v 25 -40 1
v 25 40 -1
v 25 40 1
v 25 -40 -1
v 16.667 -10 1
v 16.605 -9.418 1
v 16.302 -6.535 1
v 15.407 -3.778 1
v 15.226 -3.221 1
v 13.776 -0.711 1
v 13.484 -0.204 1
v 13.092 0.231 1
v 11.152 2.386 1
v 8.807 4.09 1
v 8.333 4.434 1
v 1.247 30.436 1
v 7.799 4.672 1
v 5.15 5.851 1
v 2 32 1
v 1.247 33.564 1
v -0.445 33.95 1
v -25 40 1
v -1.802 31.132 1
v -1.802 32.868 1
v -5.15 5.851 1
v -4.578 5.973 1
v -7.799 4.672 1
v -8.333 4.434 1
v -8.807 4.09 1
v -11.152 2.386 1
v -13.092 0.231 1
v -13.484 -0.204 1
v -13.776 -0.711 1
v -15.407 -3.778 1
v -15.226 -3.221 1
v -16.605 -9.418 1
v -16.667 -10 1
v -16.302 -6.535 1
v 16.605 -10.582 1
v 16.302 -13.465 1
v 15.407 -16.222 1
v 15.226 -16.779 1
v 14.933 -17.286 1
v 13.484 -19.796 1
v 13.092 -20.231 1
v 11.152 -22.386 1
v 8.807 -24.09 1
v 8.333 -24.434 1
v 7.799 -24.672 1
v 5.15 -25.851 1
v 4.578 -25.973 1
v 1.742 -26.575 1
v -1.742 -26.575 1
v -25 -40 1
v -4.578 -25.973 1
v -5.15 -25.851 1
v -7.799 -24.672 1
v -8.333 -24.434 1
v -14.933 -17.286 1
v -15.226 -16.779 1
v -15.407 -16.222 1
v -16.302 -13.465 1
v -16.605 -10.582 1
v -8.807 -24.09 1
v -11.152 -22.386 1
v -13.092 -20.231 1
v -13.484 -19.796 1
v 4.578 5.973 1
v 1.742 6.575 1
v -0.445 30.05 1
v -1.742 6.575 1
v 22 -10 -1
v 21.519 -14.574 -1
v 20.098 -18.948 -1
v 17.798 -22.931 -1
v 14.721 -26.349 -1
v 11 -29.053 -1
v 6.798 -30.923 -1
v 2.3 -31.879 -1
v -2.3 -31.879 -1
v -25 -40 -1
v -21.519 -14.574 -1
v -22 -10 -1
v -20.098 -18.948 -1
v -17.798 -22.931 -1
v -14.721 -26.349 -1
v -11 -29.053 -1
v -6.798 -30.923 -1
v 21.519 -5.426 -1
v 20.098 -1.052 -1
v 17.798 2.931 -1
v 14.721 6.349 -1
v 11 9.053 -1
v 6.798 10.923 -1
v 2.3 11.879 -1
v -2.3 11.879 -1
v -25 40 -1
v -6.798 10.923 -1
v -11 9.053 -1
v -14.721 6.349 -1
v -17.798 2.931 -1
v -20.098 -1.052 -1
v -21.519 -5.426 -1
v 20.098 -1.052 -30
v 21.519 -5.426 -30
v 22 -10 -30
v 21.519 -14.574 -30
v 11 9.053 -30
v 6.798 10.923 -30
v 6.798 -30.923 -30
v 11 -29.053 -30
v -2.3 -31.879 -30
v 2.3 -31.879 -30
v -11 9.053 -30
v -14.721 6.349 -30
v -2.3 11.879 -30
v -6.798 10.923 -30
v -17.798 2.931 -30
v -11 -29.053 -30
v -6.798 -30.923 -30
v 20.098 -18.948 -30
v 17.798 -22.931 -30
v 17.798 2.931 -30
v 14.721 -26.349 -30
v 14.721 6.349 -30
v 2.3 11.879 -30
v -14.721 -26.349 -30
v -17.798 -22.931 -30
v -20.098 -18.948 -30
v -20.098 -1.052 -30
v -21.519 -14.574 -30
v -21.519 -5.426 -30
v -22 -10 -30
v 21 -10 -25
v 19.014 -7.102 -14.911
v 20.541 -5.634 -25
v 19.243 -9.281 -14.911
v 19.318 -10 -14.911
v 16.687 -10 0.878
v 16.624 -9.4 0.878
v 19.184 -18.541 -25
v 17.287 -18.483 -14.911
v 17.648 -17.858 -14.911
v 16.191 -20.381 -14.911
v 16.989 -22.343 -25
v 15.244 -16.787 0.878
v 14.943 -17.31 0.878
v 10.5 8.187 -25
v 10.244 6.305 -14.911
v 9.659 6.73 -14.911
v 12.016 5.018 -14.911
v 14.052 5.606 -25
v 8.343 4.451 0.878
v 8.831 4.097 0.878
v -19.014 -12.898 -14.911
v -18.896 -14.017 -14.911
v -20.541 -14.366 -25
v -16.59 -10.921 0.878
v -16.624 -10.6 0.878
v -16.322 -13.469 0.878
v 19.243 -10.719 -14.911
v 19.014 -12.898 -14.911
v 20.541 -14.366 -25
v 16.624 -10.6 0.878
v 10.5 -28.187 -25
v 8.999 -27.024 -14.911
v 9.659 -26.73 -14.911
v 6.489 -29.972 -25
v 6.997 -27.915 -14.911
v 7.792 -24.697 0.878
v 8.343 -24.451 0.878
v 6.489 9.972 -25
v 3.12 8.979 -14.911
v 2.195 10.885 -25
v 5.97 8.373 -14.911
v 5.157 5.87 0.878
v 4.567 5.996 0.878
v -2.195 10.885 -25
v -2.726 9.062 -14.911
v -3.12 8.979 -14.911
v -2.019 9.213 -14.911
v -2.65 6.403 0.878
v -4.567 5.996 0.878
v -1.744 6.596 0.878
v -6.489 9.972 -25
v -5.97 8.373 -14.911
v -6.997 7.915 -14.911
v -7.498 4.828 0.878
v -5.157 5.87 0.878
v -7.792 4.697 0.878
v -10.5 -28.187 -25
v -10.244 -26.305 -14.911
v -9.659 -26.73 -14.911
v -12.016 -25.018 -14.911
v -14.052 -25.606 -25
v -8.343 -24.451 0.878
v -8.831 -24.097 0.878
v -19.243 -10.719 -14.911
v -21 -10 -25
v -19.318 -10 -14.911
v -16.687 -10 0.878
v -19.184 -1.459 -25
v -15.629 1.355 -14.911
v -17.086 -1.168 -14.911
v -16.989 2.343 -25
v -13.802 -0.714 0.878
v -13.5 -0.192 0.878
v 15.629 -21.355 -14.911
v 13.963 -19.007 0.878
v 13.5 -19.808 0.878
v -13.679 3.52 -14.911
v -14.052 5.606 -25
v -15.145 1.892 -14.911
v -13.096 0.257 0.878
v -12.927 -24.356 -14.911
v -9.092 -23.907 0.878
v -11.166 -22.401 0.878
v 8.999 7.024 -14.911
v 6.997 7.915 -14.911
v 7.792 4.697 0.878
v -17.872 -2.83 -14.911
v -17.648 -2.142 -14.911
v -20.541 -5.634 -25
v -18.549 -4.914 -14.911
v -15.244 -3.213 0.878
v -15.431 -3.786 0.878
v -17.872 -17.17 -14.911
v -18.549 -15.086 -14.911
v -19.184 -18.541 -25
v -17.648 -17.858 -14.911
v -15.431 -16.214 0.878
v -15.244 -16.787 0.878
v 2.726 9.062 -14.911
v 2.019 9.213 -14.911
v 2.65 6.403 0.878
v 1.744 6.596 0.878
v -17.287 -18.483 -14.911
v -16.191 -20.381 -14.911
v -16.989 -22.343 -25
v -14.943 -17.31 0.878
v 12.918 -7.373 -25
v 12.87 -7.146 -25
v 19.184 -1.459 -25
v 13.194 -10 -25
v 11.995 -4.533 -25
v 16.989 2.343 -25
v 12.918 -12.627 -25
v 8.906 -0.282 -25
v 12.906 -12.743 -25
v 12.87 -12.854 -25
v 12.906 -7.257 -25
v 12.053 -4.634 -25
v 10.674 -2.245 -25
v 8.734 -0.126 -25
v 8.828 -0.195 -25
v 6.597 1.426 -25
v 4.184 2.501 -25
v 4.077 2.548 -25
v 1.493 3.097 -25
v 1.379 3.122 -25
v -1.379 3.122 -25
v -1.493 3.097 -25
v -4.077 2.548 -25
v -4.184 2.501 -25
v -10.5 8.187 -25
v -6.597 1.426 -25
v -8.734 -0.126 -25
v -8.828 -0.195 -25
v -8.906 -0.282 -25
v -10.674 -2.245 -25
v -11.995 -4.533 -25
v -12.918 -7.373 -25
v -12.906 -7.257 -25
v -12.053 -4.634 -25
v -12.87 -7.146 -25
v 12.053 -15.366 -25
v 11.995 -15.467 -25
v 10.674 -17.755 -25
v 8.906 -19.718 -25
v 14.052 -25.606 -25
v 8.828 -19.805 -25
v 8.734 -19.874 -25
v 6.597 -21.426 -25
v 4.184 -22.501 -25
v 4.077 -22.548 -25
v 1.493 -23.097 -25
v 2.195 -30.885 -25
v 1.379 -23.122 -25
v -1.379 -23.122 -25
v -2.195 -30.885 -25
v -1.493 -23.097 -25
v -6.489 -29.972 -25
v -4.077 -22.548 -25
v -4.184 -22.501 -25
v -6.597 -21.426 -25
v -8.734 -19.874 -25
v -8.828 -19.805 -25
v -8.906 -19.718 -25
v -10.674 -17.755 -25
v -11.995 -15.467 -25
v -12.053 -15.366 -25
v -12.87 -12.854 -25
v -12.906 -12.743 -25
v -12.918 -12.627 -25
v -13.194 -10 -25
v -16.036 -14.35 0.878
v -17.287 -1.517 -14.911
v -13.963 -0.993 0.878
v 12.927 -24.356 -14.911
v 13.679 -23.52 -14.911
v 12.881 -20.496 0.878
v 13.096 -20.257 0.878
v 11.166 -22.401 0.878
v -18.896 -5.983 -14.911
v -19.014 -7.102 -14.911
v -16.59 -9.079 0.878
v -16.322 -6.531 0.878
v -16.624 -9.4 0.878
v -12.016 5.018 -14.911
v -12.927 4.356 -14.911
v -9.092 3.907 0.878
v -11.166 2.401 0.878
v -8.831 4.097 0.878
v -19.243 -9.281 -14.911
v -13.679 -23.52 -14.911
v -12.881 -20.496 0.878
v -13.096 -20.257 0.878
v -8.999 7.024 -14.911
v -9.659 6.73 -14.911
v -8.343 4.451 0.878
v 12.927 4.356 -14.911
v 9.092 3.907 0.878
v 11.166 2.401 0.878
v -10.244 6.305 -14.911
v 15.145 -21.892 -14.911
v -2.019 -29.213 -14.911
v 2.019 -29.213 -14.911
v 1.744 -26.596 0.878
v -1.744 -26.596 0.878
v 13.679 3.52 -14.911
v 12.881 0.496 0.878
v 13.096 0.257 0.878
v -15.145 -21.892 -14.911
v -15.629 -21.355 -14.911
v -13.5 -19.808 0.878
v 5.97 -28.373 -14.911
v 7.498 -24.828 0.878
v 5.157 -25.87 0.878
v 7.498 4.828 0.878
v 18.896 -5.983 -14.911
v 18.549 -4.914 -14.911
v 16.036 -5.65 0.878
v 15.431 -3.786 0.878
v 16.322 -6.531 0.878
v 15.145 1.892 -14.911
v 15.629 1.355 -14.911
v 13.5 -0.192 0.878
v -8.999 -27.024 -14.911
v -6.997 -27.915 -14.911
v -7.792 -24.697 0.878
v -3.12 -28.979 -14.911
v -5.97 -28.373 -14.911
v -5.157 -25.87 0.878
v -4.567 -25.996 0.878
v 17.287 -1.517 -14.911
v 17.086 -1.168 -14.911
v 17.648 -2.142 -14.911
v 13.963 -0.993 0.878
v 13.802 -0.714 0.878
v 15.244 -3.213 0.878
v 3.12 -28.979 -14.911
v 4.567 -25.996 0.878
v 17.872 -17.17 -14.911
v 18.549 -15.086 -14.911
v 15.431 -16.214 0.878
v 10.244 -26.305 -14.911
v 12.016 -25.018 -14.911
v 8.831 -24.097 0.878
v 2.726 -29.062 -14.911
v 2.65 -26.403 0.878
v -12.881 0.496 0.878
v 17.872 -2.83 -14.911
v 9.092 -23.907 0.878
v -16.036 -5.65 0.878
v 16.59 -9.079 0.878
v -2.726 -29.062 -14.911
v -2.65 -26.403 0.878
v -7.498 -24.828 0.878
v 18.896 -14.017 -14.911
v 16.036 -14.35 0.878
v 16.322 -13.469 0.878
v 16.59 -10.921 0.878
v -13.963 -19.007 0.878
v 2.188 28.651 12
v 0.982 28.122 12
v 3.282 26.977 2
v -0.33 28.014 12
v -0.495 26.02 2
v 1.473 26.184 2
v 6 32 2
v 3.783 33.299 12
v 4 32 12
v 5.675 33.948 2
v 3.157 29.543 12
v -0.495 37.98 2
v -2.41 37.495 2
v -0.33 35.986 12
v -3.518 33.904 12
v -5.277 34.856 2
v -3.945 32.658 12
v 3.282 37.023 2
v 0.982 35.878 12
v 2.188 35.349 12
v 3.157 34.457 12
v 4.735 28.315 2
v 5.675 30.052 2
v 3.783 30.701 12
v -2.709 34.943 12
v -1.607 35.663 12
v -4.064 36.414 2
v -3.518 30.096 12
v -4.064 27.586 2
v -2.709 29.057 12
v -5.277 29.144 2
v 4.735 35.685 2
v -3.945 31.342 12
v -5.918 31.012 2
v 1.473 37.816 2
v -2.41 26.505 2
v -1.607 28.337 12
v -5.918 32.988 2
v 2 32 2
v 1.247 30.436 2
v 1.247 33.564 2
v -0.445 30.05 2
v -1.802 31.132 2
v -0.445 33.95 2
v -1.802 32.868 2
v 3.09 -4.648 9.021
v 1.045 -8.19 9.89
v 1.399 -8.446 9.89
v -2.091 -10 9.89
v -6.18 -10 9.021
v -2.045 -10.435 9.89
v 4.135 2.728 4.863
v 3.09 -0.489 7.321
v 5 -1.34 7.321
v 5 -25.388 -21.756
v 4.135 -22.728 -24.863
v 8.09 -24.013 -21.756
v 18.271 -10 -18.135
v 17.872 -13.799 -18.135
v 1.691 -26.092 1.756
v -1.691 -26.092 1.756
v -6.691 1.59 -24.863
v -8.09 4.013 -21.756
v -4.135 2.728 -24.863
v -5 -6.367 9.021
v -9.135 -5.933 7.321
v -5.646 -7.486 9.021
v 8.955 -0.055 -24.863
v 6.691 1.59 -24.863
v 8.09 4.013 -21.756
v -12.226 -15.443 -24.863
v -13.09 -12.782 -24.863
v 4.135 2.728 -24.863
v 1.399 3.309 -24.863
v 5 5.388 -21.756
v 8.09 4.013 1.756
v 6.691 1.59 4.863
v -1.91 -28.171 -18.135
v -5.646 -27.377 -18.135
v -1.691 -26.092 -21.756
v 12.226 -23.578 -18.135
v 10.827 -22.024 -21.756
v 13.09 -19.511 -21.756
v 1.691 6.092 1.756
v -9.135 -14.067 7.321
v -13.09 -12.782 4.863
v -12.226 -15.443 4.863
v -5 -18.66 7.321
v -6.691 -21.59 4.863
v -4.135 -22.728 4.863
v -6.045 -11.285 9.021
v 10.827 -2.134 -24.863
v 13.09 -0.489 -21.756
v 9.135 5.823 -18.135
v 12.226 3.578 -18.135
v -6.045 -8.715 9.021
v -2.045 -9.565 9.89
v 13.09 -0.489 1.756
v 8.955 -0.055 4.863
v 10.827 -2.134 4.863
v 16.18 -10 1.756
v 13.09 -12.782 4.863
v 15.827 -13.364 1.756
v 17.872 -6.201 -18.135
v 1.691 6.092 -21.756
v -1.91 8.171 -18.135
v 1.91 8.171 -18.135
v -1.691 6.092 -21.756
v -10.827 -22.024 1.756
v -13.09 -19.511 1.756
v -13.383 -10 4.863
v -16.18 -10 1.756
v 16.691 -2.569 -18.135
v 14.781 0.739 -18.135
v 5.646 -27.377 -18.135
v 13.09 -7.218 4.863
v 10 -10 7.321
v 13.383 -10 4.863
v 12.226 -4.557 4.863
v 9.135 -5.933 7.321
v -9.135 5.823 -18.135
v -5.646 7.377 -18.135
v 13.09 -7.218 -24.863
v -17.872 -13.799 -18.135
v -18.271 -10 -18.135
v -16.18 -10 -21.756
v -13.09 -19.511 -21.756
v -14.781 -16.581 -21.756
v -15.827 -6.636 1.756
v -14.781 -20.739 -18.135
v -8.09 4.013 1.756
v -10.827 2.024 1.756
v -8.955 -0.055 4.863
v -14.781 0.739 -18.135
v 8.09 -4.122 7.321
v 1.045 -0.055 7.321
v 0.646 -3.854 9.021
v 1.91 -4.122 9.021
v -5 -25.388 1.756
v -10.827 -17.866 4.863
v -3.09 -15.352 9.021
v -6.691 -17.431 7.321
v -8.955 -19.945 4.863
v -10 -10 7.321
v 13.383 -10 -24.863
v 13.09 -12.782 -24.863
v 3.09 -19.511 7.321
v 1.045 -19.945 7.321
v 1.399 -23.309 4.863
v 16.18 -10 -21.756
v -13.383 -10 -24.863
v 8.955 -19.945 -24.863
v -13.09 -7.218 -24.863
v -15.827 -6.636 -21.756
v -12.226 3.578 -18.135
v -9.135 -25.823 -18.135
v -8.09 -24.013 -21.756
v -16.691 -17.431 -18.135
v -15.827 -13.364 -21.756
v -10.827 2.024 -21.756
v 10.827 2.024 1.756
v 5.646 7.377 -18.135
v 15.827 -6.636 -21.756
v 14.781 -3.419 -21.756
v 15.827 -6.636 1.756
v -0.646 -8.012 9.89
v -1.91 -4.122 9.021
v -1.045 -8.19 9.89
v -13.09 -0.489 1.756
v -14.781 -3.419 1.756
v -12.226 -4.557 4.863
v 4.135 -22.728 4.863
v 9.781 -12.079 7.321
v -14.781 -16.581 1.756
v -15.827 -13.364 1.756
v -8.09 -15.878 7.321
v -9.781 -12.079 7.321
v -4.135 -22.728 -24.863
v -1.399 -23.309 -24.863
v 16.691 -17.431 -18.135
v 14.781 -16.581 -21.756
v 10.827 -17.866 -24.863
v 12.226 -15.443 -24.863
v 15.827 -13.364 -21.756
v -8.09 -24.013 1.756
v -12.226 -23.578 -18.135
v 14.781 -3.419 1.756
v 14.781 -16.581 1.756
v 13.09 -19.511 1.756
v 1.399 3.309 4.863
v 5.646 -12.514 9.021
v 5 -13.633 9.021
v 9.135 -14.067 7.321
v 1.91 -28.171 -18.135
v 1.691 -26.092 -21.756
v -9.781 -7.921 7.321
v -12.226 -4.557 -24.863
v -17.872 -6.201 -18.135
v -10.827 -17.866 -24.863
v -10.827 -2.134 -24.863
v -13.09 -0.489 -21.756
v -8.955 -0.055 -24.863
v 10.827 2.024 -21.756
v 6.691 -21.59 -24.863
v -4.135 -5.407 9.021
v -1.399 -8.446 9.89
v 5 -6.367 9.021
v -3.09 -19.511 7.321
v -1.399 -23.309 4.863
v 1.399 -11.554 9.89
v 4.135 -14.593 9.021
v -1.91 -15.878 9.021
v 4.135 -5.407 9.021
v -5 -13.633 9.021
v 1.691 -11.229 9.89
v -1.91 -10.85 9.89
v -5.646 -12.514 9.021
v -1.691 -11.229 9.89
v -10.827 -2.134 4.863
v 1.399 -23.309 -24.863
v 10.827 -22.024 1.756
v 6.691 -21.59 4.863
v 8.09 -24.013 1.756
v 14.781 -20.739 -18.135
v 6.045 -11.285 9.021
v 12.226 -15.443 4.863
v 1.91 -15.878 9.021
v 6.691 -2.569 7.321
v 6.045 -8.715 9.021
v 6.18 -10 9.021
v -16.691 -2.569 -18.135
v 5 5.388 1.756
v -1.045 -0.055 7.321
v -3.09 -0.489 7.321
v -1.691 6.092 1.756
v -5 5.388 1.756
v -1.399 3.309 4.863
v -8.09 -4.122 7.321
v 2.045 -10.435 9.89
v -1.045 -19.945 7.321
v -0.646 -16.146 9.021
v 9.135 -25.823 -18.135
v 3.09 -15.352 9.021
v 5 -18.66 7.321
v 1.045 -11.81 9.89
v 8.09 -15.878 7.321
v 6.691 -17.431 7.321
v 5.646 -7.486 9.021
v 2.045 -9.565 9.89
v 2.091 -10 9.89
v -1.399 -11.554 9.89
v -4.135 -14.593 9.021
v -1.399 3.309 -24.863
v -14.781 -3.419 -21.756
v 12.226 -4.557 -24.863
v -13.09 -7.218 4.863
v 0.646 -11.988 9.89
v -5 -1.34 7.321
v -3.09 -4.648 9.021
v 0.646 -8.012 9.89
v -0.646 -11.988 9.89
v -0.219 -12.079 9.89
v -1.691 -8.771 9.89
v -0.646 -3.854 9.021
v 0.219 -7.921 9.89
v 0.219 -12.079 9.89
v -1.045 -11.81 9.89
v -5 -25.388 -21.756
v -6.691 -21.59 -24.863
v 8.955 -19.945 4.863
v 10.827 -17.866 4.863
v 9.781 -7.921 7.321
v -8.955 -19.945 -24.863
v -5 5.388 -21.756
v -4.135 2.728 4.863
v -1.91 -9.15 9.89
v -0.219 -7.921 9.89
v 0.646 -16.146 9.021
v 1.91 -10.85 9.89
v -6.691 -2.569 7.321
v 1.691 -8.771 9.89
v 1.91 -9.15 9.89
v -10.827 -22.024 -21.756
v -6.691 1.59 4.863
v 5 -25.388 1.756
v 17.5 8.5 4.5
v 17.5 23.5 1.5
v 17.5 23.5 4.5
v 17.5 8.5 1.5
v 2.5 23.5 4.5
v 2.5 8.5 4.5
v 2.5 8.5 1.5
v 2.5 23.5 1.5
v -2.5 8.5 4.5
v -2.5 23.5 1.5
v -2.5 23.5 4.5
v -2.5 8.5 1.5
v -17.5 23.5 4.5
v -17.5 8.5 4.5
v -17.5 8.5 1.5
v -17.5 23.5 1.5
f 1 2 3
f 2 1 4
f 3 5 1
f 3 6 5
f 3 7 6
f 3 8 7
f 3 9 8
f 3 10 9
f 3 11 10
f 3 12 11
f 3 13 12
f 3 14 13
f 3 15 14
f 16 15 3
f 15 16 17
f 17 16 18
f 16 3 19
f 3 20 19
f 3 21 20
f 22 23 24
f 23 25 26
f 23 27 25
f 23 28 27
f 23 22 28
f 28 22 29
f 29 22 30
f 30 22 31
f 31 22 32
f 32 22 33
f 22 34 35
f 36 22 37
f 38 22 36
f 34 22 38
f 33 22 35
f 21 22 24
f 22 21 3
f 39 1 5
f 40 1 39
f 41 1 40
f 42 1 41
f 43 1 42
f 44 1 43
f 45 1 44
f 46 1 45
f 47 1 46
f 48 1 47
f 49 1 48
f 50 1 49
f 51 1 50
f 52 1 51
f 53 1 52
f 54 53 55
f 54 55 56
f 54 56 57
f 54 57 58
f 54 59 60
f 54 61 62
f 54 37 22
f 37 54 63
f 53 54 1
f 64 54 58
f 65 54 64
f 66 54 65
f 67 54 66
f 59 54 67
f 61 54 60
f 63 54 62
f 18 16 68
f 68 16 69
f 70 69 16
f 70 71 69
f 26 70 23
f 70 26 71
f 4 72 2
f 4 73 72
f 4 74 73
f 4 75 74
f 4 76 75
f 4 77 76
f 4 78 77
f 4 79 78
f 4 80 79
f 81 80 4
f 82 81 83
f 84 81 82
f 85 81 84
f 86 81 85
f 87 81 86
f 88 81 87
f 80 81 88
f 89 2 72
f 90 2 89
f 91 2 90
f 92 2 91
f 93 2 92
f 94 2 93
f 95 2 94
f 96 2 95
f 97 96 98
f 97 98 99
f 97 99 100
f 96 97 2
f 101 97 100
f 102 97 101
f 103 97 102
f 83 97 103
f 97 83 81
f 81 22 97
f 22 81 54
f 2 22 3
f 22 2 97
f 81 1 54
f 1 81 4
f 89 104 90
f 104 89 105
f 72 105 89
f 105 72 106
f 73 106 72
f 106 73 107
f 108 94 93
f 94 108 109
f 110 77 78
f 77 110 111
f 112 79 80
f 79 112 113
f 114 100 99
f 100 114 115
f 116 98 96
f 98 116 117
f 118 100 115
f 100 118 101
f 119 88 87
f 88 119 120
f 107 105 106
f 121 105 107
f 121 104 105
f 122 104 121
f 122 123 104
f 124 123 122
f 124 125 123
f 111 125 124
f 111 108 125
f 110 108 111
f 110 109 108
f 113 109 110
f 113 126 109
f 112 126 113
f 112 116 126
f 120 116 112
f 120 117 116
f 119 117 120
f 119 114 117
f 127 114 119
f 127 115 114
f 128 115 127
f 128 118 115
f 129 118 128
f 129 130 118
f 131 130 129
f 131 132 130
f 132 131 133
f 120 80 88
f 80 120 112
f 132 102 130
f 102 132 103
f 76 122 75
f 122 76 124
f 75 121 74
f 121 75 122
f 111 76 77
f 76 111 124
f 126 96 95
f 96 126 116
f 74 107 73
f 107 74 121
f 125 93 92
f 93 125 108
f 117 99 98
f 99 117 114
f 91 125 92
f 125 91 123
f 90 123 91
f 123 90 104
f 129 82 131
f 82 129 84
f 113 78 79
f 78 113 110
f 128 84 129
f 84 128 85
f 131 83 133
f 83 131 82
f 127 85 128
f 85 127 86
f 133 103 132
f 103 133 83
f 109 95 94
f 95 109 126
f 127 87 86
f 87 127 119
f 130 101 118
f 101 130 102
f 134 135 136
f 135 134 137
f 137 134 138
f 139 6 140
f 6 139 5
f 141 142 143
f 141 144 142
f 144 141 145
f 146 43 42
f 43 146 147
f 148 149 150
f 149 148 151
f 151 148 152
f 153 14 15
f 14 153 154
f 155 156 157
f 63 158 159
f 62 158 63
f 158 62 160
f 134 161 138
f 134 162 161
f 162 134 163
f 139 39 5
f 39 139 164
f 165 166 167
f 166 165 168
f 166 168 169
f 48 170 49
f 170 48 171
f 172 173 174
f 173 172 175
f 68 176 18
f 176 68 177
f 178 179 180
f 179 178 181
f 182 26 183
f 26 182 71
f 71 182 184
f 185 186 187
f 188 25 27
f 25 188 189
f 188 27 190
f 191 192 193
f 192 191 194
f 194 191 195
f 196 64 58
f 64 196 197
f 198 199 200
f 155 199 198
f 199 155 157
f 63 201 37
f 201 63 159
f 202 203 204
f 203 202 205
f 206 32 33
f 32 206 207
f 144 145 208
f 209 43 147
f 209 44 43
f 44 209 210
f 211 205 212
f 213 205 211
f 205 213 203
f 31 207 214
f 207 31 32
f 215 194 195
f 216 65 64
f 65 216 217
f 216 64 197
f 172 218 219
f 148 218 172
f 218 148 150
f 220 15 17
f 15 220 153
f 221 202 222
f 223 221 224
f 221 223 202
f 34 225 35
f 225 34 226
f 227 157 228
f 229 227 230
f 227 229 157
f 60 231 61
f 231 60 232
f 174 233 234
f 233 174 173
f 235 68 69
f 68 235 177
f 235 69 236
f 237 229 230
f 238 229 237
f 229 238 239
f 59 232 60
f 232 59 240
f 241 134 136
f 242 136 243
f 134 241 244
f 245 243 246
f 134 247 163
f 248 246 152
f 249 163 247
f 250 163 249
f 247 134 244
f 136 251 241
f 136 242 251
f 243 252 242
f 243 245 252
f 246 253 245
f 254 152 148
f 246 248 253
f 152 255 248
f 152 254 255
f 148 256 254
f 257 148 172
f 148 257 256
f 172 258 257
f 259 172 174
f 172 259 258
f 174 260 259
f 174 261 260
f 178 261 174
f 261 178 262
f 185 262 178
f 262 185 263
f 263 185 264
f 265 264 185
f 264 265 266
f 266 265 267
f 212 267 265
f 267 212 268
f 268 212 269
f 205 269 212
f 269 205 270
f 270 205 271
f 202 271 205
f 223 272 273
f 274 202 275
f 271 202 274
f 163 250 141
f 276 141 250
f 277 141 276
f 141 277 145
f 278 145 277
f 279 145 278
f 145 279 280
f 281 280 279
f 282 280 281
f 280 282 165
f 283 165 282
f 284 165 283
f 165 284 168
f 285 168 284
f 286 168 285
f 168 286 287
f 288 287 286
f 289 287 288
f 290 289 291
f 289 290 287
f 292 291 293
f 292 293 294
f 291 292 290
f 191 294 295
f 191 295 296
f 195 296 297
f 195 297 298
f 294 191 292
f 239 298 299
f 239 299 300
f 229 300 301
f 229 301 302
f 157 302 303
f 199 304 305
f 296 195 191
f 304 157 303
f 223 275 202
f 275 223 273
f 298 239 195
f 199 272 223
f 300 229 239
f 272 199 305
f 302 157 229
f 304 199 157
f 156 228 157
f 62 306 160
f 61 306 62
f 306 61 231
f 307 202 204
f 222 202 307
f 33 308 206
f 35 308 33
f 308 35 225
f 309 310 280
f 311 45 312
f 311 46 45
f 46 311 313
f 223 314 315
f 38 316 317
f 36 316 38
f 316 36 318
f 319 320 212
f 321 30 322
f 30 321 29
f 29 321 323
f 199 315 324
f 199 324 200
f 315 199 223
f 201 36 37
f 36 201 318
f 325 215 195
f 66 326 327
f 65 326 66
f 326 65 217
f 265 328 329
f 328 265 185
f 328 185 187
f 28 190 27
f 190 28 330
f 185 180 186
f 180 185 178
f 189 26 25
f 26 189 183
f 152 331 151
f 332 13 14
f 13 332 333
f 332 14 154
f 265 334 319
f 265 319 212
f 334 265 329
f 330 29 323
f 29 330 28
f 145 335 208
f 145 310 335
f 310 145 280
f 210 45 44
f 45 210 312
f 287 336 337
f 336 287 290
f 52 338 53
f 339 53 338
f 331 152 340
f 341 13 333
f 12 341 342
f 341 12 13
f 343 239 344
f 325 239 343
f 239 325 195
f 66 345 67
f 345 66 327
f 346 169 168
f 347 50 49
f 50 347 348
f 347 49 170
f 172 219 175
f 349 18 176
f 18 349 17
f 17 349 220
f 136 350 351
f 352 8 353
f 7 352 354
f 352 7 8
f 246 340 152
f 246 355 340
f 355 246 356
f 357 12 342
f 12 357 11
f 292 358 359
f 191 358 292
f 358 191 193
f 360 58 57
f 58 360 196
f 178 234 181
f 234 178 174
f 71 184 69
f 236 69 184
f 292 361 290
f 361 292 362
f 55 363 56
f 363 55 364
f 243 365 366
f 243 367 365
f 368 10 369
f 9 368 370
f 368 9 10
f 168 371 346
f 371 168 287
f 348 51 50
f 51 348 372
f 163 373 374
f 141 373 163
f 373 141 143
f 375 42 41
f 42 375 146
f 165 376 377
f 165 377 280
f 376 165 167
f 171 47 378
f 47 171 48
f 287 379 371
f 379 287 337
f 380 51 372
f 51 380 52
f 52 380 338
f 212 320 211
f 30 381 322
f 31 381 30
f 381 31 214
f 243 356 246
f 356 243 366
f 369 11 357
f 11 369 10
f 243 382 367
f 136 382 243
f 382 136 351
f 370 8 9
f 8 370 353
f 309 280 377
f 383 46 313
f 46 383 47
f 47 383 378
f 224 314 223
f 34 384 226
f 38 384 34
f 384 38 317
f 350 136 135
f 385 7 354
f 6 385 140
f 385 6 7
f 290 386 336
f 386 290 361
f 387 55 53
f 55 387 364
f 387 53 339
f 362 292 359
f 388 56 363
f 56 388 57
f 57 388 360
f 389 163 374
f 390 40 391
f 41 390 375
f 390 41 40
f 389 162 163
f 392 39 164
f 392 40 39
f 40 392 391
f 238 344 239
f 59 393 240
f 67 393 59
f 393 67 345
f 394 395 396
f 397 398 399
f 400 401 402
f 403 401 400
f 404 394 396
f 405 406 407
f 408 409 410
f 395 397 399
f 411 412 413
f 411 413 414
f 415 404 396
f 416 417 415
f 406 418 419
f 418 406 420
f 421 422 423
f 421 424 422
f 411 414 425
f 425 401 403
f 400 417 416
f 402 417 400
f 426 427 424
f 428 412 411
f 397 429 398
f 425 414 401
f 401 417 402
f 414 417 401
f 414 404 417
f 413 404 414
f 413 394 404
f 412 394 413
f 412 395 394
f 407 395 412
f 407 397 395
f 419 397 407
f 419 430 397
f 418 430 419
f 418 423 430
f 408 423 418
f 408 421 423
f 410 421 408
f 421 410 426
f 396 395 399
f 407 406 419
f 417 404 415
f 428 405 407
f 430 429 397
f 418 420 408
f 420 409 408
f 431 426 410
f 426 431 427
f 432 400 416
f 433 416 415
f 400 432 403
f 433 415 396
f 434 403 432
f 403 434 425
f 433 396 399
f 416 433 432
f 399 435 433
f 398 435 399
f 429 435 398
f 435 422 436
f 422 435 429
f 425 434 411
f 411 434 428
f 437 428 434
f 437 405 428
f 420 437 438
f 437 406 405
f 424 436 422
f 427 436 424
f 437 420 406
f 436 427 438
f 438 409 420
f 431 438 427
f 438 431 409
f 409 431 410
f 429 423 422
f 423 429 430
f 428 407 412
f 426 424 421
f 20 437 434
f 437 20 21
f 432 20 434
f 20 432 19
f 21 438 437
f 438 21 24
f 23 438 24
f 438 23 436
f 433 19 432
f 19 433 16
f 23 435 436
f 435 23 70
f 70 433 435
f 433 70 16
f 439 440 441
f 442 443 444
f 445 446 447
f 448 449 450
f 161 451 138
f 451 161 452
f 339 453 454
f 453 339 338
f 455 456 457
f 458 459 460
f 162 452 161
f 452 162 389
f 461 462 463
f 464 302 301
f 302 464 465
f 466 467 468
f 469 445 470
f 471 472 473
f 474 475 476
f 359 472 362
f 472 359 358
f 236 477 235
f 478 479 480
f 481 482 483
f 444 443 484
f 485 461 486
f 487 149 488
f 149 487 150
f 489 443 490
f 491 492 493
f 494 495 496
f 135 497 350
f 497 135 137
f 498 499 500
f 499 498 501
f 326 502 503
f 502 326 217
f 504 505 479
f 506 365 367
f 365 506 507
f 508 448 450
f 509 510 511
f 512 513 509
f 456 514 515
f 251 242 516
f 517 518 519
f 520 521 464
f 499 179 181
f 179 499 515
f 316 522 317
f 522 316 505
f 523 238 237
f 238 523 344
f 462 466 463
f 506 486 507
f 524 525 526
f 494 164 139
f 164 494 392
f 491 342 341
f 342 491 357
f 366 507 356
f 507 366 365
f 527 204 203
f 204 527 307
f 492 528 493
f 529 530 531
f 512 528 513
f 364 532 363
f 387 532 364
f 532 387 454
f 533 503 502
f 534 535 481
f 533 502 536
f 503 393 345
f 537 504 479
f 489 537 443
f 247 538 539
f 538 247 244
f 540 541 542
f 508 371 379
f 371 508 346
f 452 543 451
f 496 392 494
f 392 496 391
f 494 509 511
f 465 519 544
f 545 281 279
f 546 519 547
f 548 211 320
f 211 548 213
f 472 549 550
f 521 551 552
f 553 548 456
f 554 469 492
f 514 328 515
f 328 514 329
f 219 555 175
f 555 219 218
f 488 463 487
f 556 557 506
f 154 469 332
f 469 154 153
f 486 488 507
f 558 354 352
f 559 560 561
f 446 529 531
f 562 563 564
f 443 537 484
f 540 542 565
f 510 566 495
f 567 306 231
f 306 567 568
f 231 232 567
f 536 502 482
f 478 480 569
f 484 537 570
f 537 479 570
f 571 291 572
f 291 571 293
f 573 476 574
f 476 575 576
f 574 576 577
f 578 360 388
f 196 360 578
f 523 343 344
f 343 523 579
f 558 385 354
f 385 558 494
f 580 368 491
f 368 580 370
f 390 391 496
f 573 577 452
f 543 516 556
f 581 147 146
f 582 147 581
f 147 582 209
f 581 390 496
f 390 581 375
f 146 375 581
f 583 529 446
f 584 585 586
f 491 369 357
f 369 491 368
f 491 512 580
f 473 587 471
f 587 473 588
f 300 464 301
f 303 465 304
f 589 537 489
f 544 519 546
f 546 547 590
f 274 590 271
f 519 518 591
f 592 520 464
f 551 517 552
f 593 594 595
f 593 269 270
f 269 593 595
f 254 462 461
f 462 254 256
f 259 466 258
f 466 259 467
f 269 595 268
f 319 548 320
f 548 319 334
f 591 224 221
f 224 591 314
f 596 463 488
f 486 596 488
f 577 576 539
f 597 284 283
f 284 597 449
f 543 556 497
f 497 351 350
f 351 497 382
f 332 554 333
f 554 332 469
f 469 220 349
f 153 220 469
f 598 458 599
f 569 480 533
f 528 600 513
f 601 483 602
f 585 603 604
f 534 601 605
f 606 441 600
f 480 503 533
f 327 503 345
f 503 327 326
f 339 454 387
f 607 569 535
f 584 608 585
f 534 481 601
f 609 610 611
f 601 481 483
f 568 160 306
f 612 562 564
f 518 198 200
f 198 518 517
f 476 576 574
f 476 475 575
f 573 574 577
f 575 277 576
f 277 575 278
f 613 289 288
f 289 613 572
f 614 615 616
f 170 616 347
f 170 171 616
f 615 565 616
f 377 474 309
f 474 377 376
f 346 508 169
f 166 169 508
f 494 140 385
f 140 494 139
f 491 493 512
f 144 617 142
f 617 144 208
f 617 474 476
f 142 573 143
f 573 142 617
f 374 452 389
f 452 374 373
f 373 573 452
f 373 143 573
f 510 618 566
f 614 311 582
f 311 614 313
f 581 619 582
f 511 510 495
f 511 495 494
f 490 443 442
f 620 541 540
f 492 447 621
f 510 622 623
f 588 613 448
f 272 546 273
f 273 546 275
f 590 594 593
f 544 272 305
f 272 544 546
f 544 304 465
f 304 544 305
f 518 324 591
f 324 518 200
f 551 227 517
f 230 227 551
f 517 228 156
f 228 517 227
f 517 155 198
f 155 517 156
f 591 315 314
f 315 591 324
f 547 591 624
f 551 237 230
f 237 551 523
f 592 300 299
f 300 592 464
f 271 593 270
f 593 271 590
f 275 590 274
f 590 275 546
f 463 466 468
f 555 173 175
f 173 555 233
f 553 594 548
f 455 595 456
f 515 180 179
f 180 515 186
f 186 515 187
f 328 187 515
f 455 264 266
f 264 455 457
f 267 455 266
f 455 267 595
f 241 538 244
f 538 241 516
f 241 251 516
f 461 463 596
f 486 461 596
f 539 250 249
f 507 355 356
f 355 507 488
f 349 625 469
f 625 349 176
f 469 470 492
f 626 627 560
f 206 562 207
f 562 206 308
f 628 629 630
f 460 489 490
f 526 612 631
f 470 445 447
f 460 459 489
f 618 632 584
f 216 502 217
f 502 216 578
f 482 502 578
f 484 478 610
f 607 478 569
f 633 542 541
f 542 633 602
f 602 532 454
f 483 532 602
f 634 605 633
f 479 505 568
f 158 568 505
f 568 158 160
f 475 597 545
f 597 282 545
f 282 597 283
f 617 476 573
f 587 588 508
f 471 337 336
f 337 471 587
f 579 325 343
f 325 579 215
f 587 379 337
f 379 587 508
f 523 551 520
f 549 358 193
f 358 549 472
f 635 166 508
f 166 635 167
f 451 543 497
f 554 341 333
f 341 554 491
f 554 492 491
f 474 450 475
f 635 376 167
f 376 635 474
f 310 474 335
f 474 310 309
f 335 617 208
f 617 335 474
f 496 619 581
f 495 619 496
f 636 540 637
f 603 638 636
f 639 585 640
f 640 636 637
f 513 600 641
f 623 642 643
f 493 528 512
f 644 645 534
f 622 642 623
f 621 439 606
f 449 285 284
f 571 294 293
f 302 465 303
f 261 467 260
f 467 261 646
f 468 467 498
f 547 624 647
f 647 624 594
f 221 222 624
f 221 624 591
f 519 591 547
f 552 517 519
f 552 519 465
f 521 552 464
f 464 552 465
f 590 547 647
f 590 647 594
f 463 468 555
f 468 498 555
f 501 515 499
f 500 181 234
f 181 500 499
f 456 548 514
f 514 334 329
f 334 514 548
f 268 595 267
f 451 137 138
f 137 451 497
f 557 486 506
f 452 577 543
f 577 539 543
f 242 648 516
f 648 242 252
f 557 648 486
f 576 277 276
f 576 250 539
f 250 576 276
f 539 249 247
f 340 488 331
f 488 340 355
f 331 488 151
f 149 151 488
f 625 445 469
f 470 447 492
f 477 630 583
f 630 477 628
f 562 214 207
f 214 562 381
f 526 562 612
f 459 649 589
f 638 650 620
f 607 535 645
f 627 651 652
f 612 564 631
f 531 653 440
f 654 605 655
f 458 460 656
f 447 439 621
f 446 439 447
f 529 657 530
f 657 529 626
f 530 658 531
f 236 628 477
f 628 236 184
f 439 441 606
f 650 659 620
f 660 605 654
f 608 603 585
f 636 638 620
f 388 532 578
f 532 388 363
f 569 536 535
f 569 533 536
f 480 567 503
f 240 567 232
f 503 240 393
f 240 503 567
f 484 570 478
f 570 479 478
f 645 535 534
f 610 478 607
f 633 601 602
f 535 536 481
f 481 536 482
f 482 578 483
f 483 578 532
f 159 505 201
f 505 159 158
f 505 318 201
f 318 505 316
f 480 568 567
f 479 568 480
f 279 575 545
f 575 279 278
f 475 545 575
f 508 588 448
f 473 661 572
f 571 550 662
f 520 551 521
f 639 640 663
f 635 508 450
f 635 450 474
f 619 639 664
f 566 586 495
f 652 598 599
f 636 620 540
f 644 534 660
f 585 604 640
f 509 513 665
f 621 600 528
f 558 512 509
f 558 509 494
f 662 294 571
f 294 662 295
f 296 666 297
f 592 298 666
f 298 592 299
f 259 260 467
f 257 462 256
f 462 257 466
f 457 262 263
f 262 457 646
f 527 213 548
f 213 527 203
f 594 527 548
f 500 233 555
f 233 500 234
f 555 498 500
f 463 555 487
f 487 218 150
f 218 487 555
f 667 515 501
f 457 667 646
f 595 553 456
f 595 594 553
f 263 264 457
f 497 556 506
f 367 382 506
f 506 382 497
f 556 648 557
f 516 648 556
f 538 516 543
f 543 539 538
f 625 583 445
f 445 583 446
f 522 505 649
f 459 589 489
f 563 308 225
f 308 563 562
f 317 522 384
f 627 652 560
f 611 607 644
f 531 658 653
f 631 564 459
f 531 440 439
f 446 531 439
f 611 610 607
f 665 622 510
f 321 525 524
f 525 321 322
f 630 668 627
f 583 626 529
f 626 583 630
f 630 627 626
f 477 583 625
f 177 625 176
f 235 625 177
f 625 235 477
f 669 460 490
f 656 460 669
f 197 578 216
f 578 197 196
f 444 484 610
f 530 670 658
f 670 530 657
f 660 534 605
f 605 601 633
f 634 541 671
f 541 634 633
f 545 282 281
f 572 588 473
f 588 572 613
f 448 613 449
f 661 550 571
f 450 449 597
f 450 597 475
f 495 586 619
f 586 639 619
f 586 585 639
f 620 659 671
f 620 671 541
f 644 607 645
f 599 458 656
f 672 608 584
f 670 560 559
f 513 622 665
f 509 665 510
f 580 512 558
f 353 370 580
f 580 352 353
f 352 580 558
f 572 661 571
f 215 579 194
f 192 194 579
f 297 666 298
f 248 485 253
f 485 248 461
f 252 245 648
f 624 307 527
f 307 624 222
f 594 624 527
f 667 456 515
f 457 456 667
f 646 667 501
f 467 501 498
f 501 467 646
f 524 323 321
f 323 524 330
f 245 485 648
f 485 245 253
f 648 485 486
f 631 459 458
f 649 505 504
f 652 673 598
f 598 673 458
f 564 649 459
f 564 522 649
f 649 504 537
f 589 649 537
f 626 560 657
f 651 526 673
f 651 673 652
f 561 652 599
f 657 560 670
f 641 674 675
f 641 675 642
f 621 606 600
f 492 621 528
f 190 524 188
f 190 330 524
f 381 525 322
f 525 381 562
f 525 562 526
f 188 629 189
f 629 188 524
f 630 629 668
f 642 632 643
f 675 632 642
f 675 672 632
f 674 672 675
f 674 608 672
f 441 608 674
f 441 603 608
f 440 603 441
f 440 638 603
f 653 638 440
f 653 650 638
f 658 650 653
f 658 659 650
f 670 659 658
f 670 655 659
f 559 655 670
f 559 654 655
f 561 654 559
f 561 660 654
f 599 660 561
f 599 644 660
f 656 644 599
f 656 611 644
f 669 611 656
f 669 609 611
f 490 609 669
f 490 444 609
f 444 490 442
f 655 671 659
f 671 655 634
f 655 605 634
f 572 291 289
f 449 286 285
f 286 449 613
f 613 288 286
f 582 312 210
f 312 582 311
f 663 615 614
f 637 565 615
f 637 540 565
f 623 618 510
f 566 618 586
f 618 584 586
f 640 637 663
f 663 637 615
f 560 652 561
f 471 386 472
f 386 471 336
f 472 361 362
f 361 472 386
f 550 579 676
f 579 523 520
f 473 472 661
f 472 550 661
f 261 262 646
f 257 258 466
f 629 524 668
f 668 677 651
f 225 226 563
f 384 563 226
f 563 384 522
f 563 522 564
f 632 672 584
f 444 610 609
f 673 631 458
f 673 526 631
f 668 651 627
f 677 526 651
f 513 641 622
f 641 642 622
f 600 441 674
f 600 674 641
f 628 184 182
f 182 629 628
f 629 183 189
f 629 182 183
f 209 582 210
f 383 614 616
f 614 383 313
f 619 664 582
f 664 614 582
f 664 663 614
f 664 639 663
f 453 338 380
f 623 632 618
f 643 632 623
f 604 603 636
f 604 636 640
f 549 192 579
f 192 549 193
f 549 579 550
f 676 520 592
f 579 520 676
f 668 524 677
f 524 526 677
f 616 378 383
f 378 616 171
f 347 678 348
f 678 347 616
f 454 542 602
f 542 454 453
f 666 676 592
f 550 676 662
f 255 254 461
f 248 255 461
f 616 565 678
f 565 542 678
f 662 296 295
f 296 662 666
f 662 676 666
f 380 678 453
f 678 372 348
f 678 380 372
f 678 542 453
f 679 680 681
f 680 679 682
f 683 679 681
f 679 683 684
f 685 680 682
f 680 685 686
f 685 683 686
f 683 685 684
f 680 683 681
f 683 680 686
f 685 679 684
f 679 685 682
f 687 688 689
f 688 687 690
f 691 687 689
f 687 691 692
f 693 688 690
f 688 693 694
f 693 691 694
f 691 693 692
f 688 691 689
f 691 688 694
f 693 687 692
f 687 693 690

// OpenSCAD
trackball();

module trackball() {
    color([0.2,0.2,0.2]) difference() {
        union(){
            translate([0,0,0]) cube([50,80,2],center=true);
            translate([0,-10,-30]) cylinder(r=22,h=30);
        }
        translate([0,-10,-25]) cylinder(r1=21,r2=16,h=30);
    }
    color("green") translate([0,-10,-10]) sphere(r=20);
    color("green") translate([+10,16,3]) cube([15,15,3],center=true);
    color("green") translate([-10,16,3]) cube([15,15,3],center=true);
    
    color("blue") union() {
        translate([0,32,2]) cylinder(r1=6,r2=4,h=10);
        translate([0,32,0]) cylinder(r1=2,r2=2,h=5);
    }
    
}
